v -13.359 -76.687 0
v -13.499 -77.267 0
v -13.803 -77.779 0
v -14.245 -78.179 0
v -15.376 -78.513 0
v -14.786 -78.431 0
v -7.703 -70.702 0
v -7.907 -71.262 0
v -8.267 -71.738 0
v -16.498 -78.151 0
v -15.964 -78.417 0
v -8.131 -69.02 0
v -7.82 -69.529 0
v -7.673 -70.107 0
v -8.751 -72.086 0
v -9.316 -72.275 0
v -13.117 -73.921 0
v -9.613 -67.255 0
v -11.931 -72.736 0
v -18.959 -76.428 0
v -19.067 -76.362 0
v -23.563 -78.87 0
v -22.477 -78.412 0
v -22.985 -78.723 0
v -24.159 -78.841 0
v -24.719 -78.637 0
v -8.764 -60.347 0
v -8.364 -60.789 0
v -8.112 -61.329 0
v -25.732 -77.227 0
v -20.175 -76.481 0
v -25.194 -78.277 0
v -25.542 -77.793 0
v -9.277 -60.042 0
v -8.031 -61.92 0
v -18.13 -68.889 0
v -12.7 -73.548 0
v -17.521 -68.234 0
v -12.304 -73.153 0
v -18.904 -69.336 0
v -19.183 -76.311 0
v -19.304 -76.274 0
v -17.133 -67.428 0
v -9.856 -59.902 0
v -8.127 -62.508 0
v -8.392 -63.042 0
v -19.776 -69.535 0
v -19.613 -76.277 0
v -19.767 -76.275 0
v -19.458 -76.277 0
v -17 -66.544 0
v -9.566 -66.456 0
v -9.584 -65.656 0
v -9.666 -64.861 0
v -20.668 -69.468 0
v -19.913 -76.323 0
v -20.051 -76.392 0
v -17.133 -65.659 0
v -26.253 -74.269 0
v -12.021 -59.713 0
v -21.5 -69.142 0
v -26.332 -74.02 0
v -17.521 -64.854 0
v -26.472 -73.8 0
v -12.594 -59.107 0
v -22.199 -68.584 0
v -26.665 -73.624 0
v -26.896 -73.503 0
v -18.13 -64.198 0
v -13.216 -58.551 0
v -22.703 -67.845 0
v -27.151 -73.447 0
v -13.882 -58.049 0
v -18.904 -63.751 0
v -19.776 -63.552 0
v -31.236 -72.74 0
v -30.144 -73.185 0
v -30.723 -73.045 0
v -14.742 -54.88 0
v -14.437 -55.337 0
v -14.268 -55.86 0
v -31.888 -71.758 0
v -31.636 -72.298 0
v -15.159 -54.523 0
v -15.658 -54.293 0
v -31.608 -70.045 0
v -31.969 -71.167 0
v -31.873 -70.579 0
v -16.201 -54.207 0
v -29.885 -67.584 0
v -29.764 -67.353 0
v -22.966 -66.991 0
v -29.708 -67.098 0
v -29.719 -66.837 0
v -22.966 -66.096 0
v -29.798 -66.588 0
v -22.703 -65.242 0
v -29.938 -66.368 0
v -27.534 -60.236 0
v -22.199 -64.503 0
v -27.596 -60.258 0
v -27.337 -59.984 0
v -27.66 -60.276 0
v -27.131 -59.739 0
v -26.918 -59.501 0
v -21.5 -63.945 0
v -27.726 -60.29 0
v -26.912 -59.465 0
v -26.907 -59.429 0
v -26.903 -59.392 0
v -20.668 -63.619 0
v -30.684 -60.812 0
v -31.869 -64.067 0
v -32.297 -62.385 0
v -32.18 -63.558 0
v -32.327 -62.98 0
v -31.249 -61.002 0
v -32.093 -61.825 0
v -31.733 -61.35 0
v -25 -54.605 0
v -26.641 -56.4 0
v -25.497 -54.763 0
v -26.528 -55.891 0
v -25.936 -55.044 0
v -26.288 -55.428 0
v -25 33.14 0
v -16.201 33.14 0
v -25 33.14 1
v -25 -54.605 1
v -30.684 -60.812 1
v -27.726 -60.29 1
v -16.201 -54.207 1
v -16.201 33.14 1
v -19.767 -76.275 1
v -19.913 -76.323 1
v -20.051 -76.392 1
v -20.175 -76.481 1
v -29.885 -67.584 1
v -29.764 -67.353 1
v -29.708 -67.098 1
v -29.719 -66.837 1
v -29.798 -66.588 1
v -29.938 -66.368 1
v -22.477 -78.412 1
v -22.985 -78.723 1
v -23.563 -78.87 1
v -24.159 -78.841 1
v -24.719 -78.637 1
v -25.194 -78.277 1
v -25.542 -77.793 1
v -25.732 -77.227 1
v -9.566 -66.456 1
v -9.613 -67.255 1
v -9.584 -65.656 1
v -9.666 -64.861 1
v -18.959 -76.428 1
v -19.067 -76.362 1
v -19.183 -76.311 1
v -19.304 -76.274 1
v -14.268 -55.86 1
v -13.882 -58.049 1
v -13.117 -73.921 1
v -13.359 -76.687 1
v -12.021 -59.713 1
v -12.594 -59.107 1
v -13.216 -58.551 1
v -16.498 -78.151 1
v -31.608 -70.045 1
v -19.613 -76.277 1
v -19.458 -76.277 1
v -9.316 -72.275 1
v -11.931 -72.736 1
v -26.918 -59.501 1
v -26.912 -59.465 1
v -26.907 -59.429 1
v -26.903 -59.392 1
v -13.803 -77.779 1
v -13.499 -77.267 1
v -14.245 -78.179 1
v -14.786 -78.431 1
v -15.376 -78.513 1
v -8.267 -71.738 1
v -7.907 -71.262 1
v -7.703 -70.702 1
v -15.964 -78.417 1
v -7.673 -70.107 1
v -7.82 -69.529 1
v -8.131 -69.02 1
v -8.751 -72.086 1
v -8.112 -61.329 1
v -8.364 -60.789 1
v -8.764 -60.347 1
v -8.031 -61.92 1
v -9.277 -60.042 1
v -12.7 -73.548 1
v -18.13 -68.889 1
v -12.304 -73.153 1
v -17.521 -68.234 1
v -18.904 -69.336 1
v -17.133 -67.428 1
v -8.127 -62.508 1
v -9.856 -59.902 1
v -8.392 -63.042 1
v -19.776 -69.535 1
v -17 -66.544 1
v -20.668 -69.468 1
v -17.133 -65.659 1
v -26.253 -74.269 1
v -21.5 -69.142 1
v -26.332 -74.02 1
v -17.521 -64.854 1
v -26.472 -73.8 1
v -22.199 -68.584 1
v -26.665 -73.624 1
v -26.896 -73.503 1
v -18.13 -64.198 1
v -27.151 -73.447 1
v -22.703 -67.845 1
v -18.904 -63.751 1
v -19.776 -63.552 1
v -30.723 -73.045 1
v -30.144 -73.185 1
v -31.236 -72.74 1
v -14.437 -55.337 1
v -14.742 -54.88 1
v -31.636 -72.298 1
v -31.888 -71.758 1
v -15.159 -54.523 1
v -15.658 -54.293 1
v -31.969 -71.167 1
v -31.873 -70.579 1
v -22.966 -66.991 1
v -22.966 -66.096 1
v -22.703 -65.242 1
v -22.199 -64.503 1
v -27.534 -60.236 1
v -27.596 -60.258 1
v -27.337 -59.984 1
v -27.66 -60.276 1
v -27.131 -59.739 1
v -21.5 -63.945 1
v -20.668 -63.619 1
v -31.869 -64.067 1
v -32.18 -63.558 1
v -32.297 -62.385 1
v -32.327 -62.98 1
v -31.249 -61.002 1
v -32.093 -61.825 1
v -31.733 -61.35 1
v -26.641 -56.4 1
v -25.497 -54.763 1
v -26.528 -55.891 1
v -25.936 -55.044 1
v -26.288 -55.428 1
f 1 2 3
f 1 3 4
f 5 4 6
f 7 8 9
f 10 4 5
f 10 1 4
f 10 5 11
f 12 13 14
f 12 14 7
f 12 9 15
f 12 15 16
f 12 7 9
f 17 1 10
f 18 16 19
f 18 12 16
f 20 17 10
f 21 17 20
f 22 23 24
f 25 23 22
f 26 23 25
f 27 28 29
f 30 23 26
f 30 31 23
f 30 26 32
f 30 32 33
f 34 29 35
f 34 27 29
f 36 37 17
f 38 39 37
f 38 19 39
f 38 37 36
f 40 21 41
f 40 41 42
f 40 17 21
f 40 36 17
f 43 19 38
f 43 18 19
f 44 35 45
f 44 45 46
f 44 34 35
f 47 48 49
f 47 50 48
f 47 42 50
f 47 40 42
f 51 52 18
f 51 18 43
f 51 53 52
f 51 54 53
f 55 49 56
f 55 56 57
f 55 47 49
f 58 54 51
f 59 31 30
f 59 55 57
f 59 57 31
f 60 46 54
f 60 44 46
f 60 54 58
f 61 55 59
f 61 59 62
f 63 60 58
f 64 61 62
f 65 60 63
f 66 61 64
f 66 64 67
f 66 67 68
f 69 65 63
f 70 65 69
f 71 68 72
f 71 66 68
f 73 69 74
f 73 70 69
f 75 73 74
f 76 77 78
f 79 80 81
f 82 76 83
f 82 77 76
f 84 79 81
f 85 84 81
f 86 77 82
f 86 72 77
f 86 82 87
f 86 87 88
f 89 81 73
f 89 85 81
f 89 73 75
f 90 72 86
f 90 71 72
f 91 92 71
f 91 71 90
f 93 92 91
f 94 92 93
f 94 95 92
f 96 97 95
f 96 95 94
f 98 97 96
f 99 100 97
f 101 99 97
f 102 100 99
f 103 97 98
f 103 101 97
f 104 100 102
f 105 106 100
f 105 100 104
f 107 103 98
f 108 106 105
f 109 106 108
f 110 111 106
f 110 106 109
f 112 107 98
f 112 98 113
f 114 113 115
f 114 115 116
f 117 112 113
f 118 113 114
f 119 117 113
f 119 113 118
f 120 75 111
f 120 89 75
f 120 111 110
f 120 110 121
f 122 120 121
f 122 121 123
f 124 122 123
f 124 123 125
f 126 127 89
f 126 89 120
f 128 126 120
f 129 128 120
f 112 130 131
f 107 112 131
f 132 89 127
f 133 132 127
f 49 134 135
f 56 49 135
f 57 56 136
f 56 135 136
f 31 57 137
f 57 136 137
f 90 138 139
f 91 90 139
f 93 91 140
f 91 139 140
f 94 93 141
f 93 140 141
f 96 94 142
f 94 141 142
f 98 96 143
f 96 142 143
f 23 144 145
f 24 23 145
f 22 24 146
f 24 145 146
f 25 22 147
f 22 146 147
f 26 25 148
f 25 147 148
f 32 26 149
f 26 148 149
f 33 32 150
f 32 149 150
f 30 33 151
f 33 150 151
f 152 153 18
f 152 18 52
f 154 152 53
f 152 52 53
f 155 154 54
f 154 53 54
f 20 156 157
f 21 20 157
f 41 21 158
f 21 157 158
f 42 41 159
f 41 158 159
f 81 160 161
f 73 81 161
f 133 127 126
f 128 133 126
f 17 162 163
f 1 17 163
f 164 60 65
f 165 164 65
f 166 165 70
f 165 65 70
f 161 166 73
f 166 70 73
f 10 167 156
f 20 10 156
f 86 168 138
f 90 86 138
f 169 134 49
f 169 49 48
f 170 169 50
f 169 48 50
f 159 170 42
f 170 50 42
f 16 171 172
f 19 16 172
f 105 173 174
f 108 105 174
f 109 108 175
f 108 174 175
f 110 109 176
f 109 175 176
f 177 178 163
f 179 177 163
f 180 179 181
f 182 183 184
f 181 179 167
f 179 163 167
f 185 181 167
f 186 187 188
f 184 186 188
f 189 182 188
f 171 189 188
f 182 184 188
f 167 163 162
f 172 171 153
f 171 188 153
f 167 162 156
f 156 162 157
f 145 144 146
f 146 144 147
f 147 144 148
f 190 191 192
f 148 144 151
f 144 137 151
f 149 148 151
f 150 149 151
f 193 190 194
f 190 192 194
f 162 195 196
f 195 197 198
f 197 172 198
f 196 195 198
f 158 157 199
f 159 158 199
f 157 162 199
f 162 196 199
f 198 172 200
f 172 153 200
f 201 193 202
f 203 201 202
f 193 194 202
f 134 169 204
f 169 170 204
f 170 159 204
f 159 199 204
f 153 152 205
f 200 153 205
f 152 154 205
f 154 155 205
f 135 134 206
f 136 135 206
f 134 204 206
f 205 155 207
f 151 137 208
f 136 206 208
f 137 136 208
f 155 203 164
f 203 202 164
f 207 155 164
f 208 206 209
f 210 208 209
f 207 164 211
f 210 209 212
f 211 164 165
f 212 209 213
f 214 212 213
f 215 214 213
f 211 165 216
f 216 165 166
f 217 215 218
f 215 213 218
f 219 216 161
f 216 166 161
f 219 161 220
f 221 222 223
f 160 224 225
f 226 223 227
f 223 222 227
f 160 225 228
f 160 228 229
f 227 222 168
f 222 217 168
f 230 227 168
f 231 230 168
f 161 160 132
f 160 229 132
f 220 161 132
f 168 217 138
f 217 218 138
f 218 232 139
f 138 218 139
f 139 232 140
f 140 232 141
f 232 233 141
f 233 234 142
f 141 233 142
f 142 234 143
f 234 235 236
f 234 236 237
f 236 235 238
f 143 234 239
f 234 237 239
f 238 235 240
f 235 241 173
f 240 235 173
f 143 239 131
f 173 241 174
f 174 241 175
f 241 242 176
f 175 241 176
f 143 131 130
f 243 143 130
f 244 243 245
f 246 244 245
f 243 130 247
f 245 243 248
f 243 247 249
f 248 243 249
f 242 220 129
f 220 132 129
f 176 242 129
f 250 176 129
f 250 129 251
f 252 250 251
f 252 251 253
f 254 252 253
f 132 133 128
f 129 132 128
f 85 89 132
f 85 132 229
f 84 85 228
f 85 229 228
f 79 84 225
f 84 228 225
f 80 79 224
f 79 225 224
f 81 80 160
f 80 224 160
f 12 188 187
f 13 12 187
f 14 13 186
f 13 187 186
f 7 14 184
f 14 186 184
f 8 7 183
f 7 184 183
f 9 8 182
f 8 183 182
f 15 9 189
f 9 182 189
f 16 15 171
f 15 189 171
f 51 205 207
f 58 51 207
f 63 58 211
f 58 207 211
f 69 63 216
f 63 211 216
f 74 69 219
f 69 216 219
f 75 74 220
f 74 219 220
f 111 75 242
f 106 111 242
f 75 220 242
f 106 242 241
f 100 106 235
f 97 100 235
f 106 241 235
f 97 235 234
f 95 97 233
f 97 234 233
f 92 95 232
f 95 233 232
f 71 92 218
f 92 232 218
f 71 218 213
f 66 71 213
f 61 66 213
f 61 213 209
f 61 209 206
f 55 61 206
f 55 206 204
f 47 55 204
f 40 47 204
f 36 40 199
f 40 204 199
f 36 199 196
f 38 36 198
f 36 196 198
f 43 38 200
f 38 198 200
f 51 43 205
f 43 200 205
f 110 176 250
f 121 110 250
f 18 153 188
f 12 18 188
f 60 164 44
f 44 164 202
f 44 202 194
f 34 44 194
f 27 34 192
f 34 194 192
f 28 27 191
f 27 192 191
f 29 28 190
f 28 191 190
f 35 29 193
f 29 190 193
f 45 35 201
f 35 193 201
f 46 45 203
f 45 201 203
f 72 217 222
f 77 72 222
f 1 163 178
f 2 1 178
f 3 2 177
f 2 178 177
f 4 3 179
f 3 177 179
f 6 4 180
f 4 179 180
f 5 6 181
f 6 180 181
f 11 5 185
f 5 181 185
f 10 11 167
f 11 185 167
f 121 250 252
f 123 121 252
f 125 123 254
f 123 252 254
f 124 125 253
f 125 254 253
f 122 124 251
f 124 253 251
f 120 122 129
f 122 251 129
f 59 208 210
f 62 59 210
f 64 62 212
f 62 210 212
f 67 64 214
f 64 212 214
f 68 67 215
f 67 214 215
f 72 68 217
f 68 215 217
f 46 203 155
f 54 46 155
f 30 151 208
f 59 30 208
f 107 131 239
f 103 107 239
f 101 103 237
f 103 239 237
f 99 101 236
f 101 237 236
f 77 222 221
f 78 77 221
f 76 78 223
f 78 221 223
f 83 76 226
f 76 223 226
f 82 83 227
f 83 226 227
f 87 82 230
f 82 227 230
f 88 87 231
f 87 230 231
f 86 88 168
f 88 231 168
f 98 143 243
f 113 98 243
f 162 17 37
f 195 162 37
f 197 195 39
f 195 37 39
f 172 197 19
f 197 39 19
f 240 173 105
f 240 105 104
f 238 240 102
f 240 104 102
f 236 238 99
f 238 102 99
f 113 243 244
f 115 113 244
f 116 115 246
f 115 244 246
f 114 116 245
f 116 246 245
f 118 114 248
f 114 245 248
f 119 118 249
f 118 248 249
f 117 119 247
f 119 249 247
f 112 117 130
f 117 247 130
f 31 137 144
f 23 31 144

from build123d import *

# Parameters (mm, degrees)
IZIM1_R                     = 5
Y_KSEKLIK_EKSTR_ZYON2_DEPTH = 1
IZIM2_R                     = 3
Y_KSEKLIK_EKSTR_ZYON4_DEPTH = 1


with BuildPart() as part:
    # Çizim1 → Yükseklik-Ekstrüzyon2 (new body)
    with BuildSketch(Plane.XY):
        with BuildLine():
            Line((-16.200531831, -56.860261047), (-16.200531831, 33.139738953))
            Line((-16.200531831, 33.139738953), (-25, 33.139738953))
            Line((-25, 33.139738953), (-25, -57.883306535))
            ThreePointArc((-25, -57.883306535), (-18.410044855, -76.210418758), (-16.200531831, -56.860261047))
        make_face()
        with Locations((-19.564888058, -66.277325727)):
            Circle(IZIM1_R, mode=Mode.SUBTRACT)
    extrude(amount=Y_KSEKLIK_EKSTR_ZYON2_DEPTH)

    # Çizim2 → Yükseklik-Ekstrüzyon4 (add)
    with BuildSketch(Plane.XY.offset(1)):
        with BuildLine():
            Line((-14.268162917, -55.859645389), (-13.746523784, -58.818007922))
            ThreePointArc((-13.746523784, -58.818007922), (-13.437306239, -59.381637082), (-12.848871774, -59.640554443))
            Line((-12.848871774, -59.640554443), (-9.856302857, -59.902370298))
            ThreePointArc((-9.856302857, -59.902370298), (-8.217998769, -61.049523171), (-8.392310254, -63.041912567))
            Line((-8.392310254, -63.041912567), (-10.115333894, -65.502645344))
            ThreePointArc((-10.115333894, -65.502645344), (-10.295230071, -66.119841167), (-10.062226293, -66.71900939))
            Line((-10.062226293, -66.71900939), (-8.131292285, -69.02020693))
            ThreePointArc((-8.131292285, -69.02020693), (-7.78399593, -70.989822436), (-9.316084816, -72.275397656))
            Line((-9.316084816, -72.275397656), (-12.274447349, -72.797036789))
            ThreePointArc((-12.274447349, -72.797036789), (-12.838076508, -73.106254334), (-13.09699387, -73.694688799))
            Line((-13.09699387, -73.694688799), (-13.358809725, -76.687257716))
            ThreePointArc((-13.358809725, -76.687257716), (-14.505962597, -78.325561805), (-16.498351994, -78.151250319))
            Line((-16.498351994, -78.151250319), (-18.95908477, -76.428226679))
            ThreePointArc((-18.95908477, -76.428226679), (-19.576280594, -76.248330502), (-20.175448817, -76.48133428))
            Line((-20.175448817, -76.48133428), (-22.476646357, -78.412268288))
            ThreePointArc((-22.476646357, -78.412268288), (-24.446261863, -78.759564643), (-25.731837083, -77.227475757))
            Line((-25.731837083, -77.227475757), (-26.253476216, -74.269113224))
            ThreePointArc((-26.253476216, -74.269113224), (-26.562693761, -73.705484065), (-27.151128226, -73.446566704))
            Line((-27.151128226, -73.446566704), (-30.143697143, -73.184750849))
            ThreePointArc((-30.143697143, -73.184750849), (-31.782001231, -72.037597976), (-31.607689746, -70.04520858))
            Line((-31.607689746, -70.04520858), (-29.884666106, -67.584475803))
            ThreePointArc((-29.884666106, -67.584475803), (-29.704769929, -66.967279979), (-29.937773707, -66.368111757))
            Line((-29.937773707, -66.368111757), (-31.868707715, -64.066914216))
            ThreePointArc((-31.868707715, -64.066914216), (-32.21600407, -62.09729871), (-30.683915184, -60.811723491))
            Line((-30.683915184, -60.811723491), (-27.725552651, -60.290084357))
            ThreePointArc((-27.725552651, -60.290084357), (-27.161923492, -59.980866812), (-26.90300613, -59.392432347))
            Line((-26.90300613, -59.392432347), (-26.641190275, -56.39986343))
            ThreePointArc((-26.641190275, -56.39986343), (-25.494037403, -54.761559342), (-23.501648006, -54.935870827))
            Line((-23.501648006, -54.935870827), (-21.04091523, -56.658894467))
            ThreePointArc((-21.04091523, -56.658894467), (-20.423719406, -56.838790644), (-19.824551183, -56.605786866))
            Line((-19.824551183, -56.605786866), (-17.523353643, -54.674852858))
            ThreePointArc((-17.523353643, -54.674852858), (-15.553738137, -54.327556503), (-14.268162917, -55.859645389))
        make_face()
        with Locations((-20, -66.543560573)):
            Circle(IZIM2_R, mode=Mode.SUBTRACT)
    extrude(amount=-Y_KSEKLIK_EKSTR_ZYON4_DEPTH)


solid = part.part
